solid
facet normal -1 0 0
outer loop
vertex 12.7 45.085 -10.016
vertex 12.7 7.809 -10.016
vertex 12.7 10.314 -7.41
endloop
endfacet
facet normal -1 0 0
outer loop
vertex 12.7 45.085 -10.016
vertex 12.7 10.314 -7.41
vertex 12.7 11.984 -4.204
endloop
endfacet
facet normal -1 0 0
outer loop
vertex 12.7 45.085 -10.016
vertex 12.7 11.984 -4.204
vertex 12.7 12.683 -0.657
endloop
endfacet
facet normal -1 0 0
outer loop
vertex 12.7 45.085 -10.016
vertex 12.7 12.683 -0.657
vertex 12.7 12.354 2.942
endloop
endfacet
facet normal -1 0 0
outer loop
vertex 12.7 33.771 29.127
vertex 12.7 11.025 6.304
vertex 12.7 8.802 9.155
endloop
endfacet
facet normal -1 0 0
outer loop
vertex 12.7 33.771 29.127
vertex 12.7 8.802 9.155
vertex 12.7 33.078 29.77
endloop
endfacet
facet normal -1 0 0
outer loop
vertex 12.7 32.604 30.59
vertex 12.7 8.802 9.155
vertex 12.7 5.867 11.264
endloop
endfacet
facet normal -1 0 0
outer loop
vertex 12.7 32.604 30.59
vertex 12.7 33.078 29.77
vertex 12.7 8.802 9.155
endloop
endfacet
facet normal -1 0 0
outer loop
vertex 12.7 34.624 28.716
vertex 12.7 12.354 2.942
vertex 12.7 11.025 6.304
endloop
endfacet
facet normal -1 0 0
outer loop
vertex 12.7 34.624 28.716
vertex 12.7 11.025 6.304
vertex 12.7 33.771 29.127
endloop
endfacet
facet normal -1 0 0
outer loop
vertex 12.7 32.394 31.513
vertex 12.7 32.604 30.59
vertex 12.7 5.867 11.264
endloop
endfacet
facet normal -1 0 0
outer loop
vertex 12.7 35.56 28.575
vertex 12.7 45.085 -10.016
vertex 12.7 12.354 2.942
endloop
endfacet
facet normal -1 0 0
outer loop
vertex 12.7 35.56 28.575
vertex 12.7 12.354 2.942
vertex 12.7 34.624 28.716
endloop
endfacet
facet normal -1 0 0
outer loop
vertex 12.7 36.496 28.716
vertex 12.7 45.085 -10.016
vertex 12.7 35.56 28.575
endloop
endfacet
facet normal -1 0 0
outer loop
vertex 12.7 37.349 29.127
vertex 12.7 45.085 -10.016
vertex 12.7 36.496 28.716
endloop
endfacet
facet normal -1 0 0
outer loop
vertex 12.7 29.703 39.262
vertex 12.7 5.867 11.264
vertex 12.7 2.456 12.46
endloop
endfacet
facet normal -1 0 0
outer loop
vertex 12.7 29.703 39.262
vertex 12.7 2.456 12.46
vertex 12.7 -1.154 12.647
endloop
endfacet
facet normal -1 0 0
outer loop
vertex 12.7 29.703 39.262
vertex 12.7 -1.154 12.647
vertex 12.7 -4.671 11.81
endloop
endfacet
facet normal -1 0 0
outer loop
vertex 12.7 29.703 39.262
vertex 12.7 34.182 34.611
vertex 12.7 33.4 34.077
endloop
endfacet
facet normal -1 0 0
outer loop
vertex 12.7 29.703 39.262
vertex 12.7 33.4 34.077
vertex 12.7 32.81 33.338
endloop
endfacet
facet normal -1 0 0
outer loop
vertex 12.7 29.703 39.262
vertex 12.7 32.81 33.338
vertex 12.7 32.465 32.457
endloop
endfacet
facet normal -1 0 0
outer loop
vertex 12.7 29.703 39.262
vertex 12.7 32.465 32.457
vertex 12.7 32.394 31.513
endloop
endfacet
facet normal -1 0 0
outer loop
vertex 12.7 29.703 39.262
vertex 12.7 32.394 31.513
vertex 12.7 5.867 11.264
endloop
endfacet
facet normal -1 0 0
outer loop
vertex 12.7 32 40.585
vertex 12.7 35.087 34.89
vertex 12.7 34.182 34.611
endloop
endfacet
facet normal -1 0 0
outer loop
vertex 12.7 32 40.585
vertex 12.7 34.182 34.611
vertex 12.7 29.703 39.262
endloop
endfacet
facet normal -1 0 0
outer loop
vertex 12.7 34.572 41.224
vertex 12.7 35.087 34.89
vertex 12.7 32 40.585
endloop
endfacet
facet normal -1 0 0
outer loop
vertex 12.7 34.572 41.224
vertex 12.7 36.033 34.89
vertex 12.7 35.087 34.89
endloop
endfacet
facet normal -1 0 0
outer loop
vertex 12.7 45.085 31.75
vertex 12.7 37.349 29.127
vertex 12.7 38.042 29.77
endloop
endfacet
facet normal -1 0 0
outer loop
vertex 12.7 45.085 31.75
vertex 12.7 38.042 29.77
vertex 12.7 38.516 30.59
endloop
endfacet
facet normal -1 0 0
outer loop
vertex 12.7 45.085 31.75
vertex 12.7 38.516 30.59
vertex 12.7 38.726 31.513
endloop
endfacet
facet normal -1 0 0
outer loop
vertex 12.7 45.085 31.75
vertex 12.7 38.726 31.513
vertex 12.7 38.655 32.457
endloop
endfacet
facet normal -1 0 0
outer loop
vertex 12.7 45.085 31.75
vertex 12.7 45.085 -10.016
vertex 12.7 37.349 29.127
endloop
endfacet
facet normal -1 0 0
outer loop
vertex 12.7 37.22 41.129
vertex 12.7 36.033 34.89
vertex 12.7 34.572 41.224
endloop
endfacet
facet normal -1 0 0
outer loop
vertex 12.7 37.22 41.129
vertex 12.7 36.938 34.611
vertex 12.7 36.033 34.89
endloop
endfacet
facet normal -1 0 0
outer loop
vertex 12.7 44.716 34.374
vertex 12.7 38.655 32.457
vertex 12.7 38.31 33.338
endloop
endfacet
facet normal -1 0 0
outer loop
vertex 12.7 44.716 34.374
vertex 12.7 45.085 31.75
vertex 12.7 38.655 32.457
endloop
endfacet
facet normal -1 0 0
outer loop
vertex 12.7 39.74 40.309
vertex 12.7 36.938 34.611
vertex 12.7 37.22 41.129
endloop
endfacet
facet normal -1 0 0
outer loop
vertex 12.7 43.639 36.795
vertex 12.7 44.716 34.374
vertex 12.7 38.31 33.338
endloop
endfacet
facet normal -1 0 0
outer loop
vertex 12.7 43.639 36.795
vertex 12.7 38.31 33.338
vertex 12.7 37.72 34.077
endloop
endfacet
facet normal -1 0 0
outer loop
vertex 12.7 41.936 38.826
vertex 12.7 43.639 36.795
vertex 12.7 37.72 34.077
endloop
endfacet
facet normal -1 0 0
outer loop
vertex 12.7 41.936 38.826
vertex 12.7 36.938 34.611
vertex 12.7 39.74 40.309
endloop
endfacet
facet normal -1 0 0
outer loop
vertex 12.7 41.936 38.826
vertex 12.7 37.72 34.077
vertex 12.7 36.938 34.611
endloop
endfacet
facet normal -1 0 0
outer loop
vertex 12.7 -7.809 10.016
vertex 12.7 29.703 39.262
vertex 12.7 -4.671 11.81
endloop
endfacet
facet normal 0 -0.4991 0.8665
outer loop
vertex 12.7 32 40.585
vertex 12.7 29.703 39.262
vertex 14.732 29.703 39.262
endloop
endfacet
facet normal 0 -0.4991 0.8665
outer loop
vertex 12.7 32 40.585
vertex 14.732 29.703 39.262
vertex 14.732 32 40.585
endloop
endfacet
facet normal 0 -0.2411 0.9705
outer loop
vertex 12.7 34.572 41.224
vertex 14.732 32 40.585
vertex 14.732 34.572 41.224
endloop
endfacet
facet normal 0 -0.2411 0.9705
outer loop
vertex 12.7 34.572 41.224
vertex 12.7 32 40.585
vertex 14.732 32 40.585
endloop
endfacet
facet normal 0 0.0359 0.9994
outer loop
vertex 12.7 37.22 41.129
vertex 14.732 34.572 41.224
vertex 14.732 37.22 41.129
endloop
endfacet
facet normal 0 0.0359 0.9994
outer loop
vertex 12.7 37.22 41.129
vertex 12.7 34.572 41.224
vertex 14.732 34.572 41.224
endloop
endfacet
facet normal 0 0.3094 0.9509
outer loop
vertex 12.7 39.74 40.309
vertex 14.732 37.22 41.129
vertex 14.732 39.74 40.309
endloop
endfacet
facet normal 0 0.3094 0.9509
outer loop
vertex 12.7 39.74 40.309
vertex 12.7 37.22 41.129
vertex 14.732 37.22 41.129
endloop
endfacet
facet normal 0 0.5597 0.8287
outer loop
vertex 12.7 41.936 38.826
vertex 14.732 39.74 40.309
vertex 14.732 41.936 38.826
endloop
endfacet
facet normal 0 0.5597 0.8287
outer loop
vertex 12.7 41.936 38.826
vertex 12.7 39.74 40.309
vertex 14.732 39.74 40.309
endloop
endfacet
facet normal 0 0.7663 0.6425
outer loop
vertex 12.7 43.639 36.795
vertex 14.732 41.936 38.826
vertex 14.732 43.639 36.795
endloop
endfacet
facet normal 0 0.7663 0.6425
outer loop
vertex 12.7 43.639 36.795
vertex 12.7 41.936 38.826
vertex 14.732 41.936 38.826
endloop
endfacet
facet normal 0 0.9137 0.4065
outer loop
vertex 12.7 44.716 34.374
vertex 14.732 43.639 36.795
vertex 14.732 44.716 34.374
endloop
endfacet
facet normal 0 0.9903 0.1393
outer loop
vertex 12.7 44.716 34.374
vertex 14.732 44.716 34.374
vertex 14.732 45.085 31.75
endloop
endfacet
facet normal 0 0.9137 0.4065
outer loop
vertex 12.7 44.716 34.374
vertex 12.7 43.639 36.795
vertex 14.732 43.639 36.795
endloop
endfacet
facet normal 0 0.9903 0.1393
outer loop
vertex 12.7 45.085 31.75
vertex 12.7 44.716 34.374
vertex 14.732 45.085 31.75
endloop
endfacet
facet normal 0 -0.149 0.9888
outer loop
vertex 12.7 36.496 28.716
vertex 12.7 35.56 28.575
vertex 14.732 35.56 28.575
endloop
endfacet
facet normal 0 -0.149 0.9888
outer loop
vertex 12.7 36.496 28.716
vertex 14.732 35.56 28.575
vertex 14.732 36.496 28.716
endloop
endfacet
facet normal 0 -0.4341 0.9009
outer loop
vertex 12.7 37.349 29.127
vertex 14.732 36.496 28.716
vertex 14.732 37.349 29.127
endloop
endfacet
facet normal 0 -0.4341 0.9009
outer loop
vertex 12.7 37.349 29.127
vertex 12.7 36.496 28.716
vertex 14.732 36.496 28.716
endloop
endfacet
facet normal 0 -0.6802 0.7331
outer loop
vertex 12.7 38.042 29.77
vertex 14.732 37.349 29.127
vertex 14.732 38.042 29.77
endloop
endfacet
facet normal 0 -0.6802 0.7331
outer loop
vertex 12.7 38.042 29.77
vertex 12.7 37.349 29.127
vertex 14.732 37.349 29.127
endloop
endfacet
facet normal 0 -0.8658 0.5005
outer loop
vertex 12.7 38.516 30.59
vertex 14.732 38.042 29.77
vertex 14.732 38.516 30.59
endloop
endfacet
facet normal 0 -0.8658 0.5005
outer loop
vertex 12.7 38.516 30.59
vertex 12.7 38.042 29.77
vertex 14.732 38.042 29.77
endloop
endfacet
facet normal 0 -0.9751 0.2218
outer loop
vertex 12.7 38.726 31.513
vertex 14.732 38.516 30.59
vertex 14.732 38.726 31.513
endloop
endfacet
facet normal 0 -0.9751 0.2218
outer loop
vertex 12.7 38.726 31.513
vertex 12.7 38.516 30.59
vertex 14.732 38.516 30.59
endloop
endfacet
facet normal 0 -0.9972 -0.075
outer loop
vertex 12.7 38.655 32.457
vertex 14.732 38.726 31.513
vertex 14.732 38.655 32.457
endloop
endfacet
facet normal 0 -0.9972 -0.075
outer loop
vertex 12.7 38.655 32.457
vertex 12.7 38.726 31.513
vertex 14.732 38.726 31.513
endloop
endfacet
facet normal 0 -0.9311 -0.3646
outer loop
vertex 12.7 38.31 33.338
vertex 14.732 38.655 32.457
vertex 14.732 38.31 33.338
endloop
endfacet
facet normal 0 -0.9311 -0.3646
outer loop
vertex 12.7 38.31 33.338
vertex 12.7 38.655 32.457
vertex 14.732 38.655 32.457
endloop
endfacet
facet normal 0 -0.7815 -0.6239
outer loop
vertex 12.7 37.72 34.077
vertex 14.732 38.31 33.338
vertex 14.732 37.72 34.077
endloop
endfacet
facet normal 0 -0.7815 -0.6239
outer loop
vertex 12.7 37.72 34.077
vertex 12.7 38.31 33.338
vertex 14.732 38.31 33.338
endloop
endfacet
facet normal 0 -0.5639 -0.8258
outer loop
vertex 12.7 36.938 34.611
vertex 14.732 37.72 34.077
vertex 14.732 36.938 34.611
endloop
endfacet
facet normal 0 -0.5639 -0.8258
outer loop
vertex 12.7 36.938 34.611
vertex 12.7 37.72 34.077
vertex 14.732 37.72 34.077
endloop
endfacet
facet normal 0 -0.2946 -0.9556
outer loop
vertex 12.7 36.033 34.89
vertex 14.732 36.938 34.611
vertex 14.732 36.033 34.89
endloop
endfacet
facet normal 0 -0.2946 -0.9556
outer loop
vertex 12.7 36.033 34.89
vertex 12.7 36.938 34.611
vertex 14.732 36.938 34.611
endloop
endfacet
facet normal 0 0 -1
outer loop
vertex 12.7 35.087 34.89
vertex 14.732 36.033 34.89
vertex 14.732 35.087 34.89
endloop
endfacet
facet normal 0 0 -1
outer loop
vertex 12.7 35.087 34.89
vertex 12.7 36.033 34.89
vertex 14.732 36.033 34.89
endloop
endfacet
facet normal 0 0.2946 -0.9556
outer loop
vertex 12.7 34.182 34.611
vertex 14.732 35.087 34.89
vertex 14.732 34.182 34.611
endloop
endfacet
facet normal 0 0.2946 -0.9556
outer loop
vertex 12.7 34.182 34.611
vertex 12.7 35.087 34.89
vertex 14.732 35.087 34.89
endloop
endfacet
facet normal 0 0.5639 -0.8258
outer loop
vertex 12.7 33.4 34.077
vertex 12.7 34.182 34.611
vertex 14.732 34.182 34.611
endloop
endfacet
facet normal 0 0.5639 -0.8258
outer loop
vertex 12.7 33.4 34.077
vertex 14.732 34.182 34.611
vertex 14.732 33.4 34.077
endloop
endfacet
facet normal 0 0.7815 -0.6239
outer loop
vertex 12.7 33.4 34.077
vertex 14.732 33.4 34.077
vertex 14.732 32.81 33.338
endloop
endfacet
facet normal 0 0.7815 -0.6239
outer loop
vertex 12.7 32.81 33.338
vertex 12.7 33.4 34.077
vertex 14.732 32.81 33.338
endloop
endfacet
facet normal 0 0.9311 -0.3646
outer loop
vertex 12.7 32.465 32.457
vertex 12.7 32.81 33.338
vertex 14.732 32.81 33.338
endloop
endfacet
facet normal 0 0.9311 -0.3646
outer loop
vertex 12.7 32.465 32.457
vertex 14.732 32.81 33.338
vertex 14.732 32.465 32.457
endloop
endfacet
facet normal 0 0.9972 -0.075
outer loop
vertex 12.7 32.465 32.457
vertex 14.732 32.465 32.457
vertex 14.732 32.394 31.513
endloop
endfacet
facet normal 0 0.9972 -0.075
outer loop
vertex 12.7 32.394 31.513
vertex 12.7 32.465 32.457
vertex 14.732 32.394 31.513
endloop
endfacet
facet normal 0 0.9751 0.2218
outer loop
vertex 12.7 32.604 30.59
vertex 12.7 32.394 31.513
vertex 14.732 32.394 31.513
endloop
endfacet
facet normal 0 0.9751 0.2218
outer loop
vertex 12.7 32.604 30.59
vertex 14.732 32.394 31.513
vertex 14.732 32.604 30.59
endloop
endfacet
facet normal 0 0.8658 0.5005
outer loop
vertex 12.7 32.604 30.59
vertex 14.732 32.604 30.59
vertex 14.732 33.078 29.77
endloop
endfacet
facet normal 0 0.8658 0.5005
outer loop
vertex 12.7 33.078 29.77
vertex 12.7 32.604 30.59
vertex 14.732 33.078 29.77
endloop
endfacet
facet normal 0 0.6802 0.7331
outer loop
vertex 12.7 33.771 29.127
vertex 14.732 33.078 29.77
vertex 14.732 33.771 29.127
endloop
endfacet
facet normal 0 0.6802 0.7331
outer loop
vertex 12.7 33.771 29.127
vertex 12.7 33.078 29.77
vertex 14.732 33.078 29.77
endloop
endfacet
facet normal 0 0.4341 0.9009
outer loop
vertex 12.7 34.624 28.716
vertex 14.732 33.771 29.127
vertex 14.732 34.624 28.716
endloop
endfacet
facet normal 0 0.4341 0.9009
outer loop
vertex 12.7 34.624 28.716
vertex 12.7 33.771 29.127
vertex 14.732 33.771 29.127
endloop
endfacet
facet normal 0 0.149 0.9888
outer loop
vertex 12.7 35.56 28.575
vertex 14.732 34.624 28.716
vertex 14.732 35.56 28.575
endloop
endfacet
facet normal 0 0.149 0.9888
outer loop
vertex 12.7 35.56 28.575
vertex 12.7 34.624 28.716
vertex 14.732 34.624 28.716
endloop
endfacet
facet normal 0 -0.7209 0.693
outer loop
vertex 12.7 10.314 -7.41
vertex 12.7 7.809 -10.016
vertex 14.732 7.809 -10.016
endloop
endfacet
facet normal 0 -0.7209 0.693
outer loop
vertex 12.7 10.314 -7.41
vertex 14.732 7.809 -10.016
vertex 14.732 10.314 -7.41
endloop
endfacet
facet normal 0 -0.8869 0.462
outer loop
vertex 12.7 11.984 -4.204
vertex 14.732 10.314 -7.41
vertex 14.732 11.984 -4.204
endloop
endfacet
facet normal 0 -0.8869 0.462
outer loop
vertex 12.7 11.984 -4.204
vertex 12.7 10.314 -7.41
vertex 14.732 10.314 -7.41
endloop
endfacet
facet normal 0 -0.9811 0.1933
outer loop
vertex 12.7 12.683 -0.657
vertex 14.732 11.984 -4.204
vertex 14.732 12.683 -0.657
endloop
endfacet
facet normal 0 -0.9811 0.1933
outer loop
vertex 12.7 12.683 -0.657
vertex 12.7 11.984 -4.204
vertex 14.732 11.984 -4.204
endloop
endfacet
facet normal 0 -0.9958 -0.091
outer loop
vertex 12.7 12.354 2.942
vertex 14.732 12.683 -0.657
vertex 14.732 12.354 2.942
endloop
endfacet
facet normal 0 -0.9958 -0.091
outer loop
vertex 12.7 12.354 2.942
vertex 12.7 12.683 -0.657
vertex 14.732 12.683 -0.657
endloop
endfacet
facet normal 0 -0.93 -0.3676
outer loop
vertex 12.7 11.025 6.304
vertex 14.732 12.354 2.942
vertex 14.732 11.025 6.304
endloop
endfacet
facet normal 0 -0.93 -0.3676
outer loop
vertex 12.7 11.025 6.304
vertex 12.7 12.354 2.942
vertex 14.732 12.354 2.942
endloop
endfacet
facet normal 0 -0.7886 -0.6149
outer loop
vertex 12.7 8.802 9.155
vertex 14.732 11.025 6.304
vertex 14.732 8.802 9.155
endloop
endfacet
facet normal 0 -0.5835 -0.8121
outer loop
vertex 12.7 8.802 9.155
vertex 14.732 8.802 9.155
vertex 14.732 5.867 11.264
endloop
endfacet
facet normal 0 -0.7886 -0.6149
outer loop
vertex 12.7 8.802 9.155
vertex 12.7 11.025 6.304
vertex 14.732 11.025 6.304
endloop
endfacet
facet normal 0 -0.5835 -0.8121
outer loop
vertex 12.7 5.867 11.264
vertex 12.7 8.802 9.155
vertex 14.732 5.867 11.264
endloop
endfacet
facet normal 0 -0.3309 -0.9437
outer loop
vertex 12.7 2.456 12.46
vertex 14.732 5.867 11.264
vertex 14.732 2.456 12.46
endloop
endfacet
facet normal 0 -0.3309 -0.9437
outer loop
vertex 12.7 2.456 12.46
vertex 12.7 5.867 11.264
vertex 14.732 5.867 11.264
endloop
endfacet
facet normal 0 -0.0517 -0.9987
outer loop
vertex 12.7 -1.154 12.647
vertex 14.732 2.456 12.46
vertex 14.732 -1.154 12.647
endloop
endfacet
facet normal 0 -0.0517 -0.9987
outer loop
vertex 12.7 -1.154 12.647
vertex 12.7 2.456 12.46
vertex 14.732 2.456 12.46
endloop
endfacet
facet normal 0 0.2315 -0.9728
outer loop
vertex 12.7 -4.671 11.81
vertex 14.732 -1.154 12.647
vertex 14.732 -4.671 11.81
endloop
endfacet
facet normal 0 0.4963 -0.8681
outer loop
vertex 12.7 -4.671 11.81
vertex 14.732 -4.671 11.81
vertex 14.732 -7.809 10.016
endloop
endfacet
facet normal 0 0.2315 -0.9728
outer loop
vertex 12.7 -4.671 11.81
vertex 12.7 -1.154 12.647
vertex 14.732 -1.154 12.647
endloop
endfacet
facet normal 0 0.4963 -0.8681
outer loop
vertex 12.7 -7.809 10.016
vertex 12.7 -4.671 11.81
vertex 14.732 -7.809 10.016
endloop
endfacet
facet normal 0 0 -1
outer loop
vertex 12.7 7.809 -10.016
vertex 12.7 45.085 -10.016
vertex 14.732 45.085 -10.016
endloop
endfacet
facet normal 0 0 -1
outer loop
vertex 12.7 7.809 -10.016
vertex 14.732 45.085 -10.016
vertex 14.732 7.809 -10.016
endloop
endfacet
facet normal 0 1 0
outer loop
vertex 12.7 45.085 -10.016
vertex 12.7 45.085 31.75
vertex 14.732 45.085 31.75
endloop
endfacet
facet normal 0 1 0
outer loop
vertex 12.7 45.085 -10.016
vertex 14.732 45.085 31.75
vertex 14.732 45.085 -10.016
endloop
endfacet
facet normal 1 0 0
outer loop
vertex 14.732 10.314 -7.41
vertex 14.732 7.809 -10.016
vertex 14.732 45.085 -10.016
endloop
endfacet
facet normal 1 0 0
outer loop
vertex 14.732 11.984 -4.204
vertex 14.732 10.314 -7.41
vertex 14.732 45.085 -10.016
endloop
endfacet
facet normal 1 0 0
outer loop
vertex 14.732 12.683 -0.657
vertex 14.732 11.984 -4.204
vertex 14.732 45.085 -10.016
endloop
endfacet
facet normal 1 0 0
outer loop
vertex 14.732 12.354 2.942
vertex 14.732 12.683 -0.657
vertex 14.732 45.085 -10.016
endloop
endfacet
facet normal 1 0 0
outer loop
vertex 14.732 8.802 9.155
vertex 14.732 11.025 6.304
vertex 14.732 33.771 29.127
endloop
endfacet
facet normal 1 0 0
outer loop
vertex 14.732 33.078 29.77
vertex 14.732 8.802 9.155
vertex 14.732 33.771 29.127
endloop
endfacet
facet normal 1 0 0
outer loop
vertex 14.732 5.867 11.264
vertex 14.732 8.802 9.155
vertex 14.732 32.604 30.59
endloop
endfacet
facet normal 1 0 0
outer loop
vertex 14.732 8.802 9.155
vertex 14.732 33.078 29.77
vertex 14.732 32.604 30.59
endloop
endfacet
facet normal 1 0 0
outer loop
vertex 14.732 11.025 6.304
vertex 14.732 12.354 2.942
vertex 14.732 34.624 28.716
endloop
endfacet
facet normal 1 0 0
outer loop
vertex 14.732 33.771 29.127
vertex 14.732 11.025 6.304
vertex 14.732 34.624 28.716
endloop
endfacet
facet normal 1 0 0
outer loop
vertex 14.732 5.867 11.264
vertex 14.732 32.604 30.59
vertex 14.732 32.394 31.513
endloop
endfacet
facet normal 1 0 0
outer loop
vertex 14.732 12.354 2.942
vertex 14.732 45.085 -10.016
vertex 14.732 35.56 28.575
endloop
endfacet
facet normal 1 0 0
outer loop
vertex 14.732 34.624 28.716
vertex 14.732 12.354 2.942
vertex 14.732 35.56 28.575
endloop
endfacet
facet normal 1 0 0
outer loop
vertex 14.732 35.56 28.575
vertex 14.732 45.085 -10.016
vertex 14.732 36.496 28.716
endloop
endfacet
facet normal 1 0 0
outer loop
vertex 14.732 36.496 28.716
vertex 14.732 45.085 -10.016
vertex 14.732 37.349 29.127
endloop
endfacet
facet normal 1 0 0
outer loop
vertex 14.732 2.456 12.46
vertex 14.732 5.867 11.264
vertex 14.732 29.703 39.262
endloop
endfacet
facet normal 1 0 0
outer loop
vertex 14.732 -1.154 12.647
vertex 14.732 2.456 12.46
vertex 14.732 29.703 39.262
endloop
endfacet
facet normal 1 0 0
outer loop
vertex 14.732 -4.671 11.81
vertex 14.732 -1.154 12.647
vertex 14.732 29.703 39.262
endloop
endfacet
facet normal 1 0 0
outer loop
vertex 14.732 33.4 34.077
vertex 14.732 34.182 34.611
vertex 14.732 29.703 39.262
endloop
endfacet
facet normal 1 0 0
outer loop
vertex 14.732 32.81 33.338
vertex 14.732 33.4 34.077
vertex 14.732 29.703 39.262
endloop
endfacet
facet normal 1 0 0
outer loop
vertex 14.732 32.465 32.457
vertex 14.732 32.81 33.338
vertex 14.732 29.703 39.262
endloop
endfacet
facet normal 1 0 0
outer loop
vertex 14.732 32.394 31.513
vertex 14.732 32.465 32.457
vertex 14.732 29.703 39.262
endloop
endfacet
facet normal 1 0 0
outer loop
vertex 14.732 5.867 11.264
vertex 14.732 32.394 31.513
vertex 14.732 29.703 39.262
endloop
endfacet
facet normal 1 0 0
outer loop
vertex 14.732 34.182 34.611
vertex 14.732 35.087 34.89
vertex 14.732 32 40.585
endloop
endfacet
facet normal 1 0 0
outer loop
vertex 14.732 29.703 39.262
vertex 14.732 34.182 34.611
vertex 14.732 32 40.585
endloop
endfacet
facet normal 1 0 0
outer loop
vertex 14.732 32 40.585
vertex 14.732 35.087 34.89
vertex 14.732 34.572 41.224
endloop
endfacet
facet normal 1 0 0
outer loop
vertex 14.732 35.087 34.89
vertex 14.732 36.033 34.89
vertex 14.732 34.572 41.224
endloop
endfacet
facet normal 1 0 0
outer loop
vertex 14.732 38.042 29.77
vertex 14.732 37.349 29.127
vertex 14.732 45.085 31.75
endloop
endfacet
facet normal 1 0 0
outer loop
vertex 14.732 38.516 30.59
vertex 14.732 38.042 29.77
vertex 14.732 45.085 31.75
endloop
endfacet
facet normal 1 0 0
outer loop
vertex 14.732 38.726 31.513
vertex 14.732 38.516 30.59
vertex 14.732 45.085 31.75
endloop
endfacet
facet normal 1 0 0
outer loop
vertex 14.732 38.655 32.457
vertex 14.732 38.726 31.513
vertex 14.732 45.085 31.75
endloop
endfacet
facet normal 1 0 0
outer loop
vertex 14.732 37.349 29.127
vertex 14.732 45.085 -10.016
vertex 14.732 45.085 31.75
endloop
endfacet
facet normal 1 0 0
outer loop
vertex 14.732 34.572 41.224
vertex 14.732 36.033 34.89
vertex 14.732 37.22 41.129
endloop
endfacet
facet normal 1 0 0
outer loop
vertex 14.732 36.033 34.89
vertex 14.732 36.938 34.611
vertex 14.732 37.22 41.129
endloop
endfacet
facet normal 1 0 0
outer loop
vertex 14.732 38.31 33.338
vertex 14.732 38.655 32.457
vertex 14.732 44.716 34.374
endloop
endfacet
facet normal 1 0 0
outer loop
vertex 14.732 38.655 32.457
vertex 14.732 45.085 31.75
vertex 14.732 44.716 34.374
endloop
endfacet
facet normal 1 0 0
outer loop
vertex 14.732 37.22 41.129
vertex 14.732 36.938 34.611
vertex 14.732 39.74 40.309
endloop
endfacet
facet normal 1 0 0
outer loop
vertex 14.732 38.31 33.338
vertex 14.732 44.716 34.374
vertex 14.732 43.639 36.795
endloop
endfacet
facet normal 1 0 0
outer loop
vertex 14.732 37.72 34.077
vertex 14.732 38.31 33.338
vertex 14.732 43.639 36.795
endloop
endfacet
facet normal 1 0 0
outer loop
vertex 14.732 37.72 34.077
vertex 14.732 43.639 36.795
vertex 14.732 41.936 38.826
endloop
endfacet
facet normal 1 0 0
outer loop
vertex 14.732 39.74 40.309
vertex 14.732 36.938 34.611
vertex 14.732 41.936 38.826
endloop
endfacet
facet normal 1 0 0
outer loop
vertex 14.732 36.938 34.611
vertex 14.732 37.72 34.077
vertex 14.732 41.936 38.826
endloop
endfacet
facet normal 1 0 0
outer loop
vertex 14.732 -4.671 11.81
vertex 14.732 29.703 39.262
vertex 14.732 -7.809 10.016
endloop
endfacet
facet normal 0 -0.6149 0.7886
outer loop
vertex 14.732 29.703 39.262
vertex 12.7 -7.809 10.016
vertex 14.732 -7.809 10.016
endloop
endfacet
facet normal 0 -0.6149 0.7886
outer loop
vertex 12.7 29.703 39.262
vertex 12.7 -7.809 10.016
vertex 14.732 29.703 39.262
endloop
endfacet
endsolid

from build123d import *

# Parameters (mm, degrees)
BOSS_EXTRUDE1_START = 12.7
SKETCH1_R           = 3.175
BOSS_EXTRUDE1_DEPTH = 2.032


with BuildPart() as part:
    # Sketch1 → Boss-Extrude1 (new body)
    with BuildSketch(Plane(origin=(0, 0, 0), x_dir=(0, 0, -1), z_dir=(1, 0, 0)).offset(BOSS_EXTRUDE1_START)):
        with BuildLine():
            Line((-10.015716817, -7.808675729), (-39.261787613, 29.703493203))
            ThreePointArc((-39.261787613, 29.703493203), (-40.308879957, 39.739856323), (-31.75, 45.085))
            Line((-31.75, 45.085), (10.015716817, 45.085))
            Line((10.015716817, 45.085), (10.015716817, 7.808675729))
            ThreePointArc((10.015716817, 7.808675729), (-7.808675729, 10.015716817), (-10.015716817, -7.808675729))
        make_face()
        with Locations((-31.75, 35.56)):
            Circle(SKETCH1_R, mode=Mode.SUBTRACT)
    extrude(amount=BOSS_EXTRUDE1_DEPTH)


solid = part.part
